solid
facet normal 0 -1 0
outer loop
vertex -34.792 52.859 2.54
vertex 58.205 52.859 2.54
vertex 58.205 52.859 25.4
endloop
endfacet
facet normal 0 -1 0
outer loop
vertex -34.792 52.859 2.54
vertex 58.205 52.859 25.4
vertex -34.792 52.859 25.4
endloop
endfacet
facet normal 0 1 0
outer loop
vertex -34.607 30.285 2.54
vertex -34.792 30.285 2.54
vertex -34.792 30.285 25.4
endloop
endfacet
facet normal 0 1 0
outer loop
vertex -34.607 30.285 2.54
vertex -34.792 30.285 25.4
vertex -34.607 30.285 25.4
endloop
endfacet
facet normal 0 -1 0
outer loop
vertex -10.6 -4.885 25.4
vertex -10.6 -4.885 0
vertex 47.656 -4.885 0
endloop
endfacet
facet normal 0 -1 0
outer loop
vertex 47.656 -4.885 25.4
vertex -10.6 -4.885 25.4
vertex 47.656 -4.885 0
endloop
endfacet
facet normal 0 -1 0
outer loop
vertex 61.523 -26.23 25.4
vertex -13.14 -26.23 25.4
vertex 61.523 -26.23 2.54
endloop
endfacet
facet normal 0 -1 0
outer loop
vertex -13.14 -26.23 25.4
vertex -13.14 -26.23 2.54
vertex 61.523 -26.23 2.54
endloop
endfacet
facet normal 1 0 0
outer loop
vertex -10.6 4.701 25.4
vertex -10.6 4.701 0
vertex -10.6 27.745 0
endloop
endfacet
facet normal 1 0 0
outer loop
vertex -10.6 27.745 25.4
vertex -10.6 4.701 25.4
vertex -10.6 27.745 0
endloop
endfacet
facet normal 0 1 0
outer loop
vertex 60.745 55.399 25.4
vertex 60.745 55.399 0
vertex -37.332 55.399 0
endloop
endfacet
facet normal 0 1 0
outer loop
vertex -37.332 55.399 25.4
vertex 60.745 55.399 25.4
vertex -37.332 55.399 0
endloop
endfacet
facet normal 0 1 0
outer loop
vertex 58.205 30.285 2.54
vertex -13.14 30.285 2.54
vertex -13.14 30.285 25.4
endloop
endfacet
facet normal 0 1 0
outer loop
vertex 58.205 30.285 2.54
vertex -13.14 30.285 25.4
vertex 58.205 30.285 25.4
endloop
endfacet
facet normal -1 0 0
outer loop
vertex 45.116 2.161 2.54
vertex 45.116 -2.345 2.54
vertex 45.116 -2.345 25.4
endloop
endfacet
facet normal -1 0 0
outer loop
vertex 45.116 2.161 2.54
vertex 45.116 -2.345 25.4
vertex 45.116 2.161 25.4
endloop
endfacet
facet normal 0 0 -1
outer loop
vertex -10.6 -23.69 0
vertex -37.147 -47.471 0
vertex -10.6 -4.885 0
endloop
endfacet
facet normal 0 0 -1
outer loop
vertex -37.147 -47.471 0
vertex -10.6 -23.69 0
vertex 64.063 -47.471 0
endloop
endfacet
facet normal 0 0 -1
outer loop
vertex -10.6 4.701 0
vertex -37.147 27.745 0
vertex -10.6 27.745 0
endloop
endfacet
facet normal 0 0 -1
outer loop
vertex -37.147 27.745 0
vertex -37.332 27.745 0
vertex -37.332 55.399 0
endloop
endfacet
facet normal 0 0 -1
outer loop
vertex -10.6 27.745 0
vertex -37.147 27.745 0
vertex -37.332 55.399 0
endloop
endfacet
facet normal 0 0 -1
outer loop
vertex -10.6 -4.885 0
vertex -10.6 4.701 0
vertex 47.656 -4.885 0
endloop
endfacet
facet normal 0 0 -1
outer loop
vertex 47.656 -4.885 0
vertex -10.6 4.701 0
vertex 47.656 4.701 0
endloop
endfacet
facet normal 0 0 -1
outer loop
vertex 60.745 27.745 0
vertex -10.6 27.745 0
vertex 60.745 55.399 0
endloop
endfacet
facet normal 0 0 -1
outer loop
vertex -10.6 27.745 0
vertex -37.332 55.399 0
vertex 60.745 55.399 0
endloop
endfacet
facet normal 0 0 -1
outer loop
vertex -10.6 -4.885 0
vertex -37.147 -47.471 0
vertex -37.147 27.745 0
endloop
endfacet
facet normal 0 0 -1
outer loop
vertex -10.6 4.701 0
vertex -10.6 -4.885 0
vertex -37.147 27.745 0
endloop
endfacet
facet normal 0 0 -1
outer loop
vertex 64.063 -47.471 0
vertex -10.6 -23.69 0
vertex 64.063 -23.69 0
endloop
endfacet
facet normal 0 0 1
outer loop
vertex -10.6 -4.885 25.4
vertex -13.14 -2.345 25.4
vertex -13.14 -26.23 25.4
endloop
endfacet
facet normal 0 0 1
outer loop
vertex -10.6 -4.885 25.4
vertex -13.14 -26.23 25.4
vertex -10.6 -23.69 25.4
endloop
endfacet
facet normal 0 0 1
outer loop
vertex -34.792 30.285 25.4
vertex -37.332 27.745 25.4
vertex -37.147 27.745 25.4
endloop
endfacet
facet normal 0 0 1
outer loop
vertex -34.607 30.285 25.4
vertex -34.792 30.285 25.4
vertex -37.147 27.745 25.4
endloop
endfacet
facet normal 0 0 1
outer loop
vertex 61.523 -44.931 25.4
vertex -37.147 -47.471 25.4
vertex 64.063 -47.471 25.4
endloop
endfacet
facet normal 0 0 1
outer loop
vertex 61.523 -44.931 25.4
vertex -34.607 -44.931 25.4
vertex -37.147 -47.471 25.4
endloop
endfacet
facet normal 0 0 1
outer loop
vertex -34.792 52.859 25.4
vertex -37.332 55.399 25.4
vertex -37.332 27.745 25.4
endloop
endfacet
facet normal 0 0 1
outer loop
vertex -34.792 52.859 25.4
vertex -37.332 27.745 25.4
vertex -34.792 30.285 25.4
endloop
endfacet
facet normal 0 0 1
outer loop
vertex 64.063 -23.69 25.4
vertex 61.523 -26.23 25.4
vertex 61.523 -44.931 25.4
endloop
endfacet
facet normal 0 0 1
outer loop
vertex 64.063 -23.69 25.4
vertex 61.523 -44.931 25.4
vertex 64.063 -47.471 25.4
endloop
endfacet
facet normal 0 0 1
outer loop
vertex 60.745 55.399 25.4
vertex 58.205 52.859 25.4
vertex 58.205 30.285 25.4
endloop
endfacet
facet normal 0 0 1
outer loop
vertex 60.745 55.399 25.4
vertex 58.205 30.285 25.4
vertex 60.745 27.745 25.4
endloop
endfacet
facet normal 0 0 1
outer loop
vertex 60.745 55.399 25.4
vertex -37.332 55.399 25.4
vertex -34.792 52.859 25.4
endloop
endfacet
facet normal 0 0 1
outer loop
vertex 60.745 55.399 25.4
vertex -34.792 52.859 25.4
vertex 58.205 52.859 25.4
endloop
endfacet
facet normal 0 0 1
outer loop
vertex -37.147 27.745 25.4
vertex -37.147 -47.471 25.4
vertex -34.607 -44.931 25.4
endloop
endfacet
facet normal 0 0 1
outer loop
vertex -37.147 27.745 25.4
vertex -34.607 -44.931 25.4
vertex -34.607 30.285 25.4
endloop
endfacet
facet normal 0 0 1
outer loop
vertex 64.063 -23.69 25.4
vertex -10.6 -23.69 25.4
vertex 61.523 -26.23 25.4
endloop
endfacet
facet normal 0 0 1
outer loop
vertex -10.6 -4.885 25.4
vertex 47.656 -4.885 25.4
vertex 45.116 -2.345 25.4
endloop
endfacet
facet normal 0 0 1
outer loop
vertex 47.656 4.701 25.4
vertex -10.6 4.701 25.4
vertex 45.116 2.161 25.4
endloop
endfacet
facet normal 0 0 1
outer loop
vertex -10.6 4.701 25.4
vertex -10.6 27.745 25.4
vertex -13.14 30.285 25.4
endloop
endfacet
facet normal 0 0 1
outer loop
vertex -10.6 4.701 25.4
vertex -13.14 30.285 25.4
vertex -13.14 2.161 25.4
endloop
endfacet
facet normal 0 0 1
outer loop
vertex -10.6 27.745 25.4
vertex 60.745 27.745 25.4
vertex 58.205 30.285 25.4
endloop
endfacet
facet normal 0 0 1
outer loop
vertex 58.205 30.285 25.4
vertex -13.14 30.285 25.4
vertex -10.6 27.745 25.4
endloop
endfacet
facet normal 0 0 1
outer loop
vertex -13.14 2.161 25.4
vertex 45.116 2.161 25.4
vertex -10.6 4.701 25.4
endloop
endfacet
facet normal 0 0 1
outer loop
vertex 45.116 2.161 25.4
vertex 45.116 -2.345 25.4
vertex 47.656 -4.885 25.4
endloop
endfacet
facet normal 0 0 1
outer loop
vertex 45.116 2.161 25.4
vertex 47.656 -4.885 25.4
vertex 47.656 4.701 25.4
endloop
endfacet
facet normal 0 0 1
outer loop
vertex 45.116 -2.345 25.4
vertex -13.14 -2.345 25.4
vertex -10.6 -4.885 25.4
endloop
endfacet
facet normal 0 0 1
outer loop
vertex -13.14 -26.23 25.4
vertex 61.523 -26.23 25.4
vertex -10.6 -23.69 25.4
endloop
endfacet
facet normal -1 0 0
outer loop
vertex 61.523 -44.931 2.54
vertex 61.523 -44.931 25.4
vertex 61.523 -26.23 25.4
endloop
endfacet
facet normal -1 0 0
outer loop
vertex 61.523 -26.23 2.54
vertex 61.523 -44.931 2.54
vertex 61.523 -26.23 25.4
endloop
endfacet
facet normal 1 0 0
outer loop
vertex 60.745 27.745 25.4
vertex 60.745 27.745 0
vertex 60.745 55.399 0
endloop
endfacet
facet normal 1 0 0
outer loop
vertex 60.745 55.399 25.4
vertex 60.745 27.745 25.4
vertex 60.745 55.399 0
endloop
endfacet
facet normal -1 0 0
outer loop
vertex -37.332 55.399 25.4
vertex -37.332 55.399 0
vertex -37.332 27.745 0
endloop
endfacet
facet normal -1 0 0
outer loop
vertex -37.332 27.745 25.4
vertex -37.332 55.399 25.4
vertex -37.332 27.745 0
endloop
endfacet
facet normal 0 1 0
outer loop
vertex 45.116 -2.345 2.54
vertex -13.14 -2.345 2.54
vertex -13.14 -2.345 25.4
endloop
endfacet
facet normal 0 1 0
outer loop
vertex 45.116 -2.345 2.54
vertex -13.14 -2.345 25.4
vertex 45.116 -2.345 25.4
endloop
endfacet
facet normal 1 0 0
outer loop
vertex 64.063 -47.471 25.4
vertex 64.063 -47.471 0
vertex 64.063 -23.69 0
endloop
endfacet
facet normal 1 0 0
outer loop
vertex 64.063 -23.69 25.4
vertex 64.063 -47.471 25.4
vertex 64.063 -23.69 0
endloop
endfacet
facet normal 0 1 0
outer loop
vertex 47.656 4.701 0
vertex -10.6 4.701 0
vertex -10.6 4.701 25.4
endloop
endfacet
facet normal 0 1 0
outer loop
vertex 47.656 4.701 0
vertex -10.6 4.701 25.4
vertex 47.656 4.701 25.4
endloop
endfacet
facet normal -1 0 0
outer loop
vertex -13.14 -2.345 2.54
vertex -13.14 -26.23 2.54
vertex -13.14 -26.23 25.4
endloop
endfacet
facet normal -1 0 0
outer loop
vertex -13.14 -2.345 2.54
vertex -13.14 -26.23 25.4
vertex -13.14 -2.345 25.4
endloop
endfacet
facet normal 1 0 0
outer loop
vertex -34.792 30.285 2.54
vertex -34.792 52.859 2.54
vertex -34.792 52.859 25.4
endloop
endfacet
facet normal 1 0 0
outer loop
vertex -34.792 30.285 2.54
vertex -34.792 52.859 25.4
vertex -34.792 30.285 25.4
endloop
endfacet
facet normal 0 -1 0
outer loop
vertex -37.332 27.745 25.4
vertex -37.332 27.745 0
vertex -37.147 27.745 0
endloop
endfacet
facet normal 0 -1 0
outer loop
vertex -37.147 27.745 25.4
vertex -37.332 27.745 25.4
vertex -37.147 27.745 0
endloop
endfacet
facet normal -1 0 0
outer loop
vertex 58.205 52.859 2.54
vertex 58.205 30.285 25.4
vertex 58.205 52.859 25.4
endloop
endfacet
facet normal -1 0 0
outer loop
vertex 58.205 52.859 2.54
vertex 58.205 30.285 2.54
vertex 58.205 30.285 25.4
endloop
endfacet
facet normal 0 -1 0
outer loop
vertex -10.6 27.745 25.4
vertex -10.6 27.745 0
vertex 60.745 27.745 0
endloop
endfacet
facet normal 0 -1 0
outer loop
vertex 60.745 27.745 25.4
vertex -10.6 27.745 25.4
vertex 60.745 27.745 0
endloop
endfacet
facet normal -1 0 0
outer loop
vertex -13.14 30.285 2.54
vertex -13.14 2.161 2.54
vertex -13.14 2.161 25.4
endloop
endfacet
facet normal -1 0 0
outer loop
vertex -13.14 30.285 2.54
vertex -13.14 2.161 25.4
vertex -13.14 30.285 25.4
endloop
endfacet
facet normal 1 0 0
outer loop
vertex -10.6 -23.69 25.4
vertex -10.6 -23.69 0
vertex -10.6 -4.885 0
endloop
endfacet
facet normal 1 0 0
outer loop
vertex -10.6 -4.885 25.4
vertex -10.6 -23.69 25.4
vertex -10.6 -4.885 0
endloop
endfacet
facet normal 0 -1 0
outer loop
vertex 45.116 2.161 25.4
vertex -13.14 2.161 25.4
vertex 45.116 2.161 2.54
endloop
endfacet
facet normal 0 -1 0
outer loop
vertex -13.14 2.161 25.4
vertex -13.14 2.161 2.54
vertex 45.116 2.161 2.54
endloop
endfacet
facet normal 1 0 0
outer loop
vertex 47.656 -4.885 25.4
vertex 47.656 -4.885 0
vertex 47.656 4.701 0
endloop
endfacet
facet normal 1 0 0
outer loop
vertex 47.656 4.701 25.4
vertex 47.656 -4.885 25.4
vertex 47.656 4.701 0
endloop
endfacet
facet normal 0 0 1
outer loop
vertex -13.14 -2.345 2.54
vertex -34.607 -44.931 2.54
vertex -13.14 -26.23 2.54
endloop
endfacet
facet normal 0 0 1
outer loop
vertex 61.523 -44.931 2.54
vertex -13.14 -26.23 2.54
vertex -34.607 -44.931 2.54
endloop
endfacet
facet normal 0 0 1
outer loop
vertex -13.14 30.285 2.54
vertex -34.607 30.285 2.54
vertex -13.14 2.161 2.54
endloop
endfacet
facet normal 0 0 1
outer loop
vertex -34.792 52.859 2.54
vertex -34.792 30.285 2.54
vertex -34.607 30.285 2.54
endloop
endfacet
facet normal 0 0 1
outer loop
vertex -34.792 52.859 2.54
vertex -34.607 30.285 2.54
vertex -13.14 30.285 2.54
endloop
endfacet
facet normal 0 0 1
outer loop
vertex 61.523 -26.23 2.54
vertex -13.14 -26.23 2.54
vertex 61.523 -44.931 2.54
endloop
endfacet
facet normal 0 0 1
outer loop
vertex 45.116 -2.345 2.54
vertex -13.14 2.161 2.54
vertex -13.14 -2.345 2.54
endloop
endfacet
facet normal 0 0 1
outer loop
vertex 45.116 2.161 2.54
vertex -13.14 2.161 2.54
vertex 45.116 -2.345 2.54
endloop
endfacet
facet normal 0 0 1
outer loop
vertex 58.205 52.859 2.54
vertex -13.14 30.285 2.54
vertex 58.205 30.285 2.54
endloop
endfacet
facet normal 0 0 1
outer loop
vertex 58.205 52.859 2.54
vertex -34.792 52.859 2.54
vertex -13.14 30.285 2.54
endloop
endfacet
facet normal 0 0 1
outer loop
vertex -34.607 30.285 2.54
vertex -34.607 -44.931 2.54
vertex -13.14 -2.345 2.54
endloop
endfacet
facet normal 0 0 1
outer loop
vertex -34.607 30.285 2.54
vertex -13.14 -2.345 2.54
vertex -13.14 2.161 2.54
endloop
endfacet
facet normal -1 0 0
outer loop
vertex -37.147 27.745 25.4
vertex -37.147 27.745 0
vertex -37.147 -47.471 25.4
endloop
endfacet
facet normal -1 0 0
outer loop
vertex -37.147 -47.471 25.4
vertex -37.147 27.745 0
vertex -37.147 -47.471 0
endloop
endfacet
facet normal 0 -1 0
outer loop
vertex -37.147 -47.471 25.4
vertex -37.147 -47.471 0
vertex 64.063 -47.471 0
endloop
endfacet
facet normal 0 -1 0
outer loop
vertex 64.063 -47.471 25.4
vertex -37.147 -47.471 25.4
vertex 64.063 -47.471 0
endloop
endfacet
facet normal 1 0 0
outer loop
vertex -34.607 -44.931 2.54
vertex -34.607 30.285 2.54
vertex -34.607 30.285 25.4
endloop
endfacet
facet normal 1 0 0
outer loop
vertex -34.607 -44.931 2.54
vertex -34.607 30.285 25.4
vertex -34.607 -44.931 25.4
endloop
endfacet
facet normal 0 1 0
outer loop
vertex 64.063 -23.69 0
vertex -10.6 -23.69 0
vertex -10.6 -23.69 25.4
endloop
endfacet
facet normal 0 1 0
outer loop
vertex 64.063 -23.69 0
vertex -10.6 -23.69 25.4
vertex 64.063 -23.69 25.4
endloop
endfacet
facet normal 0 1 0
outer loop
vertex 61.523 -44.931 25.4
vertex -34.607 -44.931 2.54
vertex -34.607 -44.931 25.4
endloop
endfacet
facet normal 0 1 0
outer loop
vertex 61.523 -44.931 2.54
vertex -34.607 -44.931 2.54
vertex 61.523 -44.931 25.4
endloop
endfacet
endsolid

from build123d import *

# Parameters (mm, degrees)
F0_W     = 74.6637145057
F0_H     = 23.7817782909
F0_W_2   = 58.2561278716
F0_H_2   = 9.5864515752
F1_DEPTH = 25.4
F2_T     = -2.54


with BuildPart() as f1:
    # F0 (on Top) → F1 (new body)
    with BuildSketch(Plane.XY):
        Polygon((60.7449188828, 55.3986318409), (-37.3318567872, 55.3986318409), (-37.3318567872, 27.7454033494), (-37.1474996209, 27.7454033494), (-10.6004038826, 27.7454033494), (60.7449188828, 27.7454033494), align=None)
        Polygon((-10.6004038826, 27.7454033494), (-37.1474996209, 27.7454033494), (-37.1474996209, -47.4713742733), (-10.6004038826, -47.4713742733), (-10.6004038826, -23.6895959824), (-10.6004038826, -4.8854034394), (-10.6004038826, 4.7010481358), align=None)
        with Locations((26.7314533703, -35.5804851279)):
            Rectangle(F0_W, F0_H)
        with Locations((18.5276600532, -0.0921776518)):
            Rectangle(F0_W_2, F0_H_2)
    extrude(amount=F1_DEPTH)

    # F2
    f2_openings = [f1.faces().sort_by_distance(p)[0] for p in [
        (5.947866, 4.234734, 25.4),
    ]]
    offset(amount=F2_T, openings=f2_openings, kind=Kind.INTERSECTION)


solid = f1.part
